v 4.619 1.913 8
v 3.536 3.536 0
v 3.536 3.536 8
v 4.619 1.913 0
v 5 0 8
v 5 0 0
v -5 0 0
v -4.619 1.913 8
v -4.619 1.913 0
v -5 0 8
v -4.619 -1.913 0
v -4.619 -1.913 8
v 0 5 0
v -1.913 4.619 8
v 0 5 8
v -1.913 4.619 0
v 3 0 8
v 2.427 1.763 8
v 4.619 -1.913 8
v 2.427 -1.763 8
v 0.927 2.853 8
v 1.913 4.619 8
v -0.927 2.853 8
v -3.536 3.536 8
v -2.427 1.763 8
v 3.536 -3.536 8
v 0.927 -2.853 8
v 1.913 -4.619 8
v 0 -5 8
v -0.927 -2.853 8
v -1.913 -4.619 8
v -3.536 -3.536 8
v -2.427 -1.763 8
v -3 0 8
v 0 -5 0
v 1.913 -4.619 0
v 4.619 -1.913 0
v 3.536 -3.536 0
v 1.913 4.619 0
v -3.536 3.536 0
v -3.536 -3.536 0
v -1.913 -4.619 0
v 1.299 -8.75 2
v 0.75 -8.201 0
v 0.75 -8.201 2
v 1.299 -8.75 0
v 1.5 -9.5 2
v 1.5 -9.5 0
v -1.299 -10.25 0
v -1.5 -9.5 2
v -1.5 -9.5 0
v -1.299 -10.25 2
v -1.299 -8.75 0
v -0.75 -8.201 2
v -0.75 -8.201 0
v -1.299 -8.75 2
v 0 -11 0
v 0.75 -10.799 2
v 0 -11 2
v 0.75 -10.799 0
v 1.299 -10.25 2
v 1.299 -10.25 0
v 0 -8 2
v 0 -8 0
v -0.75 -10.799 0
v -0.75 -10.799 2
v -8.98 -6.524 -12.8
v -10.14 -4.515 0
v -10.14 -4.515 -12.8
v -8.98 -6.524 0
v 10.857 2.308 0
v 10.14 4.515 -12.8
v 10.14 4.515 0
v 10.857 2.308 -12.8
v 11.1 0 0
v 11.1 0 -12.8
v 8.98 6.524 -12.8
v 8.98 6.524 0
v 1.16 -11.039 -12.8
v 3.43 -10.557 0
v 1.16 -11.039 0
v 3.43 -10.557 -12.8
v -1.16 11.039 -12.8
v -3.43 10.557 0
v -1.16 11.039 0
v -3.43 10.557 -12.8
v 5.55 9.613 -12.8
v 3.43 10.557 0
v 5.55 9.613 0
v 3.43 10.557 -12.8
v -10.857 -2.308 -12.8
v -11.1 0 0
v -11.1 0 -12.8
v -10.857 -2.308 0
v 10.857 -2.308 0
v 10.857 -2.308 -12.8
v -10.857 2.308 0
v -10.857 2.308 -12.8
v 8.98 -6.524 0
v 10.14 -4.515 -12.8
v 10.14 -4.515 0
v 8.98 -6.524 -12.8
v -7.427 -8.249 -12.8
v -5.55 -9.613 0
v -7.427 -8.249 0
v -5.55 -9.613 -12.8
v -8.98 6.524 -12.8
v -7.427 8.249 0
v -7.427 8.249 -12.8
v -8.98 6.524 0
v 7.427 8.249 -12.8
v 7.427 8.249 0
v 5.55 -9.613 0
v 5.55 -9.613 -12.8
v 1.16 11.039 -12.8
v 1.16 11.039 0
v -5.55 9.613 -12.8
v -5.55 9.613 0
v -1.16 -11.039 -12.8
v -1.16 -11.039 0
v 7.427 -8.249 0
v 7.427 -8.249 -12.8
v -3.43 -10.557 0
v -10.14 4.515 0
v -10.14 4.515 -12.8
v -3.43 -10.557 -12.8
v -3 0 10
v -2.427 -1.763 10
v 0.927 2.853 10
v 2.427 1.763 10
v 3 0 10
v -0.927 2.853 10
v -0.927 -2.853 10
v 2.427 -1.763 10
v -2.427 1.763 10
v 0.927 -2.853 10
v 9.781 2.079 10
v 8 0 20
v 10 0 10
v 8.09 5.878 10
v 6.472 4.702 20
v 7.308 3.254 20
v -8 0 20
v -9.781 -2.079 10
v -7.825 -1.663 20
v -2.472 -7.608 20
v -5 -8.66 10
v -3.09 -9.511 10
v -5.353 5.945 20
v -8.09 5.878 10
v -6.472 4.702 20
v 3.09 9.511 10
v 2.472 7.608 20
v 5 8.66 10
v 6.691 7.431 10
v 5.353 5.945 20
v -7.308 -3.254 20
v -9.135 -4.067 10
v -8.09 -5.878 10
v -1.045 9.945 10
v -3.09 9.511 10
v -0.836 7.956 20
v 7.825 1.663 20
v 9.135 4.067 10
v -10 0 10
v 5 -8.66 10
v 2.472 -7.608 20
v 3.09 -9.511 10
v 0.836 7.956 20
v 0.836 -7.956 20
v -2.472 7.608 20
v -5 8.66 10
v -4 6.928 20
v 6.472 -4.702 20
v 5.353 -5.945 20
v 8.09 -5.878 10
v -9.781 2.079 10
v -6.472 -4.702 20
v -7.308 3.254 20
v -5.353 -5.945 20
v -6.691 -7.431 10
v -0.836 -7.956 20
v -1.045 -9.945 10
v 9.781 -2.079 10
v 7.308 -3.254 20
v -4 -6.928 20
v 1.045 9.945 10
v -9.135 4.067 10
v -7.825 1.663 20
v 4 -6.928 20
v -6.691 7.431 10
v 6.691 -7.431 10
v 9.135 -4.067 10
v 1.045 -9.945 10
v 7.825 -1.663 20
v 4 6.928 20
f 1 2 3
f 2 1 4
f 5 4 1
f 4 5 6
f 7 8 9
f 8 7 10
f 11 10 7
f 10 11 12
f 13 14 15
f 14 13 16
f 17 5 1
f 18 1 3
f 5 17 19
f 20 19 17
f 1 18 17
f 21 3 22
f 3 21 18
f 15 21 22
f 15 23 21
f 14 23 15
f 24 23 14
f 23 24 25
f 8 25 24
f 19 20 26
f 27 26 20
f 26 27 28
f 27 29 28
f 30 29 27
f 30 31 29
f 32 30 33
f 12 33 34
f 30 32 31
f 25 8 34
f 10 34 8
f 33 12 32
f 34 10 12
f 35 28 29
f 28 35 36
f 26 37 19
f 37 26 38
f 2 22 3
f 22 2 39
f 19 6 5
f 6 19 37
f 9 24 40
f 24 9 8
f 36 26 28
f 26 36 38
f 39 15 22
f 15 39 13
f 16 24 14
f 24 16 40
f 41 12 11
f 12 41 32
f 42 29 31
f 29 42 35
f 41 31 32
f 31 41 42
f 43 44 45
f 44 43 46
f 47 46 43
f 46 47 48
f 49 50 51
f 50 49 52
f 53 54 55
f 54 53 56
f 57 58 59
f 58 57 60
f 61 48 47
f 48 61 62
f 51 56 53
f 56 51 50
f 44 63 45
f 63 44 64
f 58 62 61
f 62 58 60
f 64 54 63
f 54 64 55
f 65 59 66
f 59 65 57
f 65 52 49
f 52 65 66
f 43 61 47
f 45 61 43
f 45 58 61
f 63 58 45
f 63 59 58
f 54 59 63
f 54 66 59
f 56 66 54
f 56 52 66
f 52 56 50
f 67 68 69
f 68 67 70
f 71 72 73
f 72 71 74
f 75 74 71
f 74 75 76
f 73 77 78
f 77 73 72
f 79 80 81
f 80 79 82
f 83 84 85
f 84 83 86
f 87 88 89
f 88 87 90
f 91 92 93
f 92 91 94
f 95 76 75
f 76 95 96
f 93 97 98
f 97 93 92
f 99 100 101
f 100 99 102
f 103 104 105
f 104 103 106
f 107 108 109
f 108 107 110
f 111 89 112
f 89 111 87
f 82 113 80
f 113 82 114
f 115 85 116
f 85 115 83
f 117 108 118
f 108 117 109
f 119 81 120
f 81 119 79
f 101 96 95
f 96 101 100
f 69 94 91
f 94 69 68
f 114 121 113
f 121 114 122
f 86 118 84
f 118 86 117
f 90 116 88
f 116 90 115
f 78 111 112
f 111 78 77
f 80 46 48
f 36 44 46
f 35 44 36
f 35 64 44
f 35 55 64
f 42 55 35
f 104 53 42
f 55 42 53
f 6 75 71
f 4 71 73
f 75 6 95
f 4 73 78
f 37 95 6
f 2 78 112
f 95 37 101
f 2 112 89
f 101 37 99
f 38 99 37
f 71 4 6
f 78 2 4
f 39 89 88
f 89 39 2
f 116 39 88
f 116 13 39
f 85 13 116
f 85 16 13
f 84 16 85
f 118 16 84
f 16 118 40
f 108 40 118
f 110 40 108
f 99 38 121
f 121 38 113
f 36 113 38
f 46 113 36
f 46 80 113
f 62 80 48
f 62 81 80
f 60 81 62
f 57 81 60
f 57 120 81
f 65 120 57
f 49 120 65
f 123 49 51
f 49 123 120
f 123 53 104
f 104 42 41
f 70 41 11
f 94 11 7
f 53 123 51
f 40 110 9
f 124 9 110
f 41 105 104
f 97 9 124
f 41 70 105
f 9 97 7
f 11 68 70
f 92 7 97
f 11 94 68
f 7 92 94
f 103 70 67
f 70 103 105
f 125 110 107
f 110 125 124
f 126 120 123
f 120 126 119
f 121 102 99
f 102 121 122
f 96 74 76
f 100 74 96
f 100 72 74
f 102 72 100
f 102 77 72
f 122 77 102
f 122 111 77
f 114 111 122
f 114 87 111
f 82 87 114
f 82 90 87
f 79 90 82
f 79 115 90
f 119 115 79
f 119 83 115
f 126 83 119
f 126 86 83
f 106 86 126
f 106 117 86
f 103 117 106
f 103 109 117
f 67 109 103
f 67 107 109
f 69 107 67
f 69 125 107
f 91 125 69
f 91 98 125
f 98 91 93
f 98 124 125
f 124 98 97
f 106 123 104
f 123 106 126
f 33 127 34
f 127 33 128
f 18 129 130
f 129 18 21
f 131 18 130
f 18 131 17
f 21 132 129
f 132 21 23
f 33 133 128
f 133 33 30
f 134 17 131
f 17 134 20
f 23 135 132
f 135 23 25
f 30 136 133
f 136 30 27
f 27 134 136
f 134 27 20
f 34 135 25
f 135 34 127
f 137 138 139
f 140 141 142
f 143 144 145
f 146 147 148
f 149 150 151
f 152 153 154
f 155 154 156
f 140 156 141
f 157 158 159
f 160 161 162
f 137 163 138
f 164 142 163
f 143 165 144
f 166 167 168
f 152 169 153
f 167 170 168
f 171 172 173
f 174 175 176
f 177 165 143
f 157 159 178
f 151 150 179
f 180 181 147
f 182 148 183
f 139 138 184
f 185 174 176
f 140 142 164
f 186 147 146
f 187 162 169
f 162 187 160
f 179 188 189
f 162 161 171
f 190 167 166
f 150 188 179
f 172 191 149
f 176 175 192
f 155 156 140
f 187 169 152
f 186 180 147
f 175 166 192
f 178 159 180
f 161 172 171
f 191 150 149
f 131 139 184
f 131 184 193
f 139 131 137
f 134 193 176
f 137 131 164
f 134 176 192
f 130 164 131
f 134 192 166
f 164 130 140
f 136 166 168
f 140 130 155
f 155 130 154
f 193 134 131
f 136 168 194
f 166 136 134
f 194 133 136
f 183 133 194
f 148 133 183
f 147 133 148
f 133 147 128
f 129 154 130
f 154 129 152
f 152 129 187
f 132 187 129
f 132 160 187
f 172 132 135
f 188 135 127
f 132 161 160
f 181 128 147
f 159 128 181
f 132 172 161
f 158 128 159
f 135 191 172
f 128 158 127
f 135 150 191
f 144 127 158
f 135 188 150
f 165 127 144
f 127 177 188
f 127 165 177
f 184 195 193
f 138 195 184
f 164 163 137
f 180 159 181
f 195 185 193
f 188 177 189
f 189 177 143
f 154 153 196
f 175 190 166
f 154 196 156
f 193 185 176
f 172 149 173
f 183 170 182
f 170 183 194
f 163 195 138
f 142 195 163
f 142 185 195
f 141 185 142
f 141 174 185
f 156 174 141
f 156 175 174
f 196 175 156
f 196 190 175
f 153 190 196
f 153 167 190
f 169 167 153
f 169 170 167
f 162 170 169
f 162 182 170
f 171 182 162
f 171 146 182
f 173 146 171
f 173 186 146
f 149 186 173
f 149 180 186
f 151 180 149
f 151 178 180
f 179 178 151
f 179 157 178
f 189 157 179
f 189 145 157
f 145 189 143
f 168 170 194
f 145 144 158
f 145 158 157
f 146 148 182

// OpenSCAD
module lorlinck()
{
	// Lorlin CK series switch
	color([ 0.7, 0.7, 0.75 ]) {
		translate([0, 0, -2]) cylinder(r = 10/2, h = 10);
		translate([0, -9.5, -2]) cylinder(r = 3/2, h = 4, $fn = 12);
		translate([0, 0, -12.8]) cylinder(r = 22.2/2, h = 12.8);
	}
	color([ 0.3, 0.3, 0.3 ])
		cylinder(r = 6/2, h = 15); /* height of unmodified part: 50 */
	/* knob (just imaginary atm) */
	color([ 0.3, 0.8, 0.3 ]) translate([ 0, 0, 10 ])
		cylinder(r1 = 10, r2 = 8, h = 10);
	
}

lorlinck();
